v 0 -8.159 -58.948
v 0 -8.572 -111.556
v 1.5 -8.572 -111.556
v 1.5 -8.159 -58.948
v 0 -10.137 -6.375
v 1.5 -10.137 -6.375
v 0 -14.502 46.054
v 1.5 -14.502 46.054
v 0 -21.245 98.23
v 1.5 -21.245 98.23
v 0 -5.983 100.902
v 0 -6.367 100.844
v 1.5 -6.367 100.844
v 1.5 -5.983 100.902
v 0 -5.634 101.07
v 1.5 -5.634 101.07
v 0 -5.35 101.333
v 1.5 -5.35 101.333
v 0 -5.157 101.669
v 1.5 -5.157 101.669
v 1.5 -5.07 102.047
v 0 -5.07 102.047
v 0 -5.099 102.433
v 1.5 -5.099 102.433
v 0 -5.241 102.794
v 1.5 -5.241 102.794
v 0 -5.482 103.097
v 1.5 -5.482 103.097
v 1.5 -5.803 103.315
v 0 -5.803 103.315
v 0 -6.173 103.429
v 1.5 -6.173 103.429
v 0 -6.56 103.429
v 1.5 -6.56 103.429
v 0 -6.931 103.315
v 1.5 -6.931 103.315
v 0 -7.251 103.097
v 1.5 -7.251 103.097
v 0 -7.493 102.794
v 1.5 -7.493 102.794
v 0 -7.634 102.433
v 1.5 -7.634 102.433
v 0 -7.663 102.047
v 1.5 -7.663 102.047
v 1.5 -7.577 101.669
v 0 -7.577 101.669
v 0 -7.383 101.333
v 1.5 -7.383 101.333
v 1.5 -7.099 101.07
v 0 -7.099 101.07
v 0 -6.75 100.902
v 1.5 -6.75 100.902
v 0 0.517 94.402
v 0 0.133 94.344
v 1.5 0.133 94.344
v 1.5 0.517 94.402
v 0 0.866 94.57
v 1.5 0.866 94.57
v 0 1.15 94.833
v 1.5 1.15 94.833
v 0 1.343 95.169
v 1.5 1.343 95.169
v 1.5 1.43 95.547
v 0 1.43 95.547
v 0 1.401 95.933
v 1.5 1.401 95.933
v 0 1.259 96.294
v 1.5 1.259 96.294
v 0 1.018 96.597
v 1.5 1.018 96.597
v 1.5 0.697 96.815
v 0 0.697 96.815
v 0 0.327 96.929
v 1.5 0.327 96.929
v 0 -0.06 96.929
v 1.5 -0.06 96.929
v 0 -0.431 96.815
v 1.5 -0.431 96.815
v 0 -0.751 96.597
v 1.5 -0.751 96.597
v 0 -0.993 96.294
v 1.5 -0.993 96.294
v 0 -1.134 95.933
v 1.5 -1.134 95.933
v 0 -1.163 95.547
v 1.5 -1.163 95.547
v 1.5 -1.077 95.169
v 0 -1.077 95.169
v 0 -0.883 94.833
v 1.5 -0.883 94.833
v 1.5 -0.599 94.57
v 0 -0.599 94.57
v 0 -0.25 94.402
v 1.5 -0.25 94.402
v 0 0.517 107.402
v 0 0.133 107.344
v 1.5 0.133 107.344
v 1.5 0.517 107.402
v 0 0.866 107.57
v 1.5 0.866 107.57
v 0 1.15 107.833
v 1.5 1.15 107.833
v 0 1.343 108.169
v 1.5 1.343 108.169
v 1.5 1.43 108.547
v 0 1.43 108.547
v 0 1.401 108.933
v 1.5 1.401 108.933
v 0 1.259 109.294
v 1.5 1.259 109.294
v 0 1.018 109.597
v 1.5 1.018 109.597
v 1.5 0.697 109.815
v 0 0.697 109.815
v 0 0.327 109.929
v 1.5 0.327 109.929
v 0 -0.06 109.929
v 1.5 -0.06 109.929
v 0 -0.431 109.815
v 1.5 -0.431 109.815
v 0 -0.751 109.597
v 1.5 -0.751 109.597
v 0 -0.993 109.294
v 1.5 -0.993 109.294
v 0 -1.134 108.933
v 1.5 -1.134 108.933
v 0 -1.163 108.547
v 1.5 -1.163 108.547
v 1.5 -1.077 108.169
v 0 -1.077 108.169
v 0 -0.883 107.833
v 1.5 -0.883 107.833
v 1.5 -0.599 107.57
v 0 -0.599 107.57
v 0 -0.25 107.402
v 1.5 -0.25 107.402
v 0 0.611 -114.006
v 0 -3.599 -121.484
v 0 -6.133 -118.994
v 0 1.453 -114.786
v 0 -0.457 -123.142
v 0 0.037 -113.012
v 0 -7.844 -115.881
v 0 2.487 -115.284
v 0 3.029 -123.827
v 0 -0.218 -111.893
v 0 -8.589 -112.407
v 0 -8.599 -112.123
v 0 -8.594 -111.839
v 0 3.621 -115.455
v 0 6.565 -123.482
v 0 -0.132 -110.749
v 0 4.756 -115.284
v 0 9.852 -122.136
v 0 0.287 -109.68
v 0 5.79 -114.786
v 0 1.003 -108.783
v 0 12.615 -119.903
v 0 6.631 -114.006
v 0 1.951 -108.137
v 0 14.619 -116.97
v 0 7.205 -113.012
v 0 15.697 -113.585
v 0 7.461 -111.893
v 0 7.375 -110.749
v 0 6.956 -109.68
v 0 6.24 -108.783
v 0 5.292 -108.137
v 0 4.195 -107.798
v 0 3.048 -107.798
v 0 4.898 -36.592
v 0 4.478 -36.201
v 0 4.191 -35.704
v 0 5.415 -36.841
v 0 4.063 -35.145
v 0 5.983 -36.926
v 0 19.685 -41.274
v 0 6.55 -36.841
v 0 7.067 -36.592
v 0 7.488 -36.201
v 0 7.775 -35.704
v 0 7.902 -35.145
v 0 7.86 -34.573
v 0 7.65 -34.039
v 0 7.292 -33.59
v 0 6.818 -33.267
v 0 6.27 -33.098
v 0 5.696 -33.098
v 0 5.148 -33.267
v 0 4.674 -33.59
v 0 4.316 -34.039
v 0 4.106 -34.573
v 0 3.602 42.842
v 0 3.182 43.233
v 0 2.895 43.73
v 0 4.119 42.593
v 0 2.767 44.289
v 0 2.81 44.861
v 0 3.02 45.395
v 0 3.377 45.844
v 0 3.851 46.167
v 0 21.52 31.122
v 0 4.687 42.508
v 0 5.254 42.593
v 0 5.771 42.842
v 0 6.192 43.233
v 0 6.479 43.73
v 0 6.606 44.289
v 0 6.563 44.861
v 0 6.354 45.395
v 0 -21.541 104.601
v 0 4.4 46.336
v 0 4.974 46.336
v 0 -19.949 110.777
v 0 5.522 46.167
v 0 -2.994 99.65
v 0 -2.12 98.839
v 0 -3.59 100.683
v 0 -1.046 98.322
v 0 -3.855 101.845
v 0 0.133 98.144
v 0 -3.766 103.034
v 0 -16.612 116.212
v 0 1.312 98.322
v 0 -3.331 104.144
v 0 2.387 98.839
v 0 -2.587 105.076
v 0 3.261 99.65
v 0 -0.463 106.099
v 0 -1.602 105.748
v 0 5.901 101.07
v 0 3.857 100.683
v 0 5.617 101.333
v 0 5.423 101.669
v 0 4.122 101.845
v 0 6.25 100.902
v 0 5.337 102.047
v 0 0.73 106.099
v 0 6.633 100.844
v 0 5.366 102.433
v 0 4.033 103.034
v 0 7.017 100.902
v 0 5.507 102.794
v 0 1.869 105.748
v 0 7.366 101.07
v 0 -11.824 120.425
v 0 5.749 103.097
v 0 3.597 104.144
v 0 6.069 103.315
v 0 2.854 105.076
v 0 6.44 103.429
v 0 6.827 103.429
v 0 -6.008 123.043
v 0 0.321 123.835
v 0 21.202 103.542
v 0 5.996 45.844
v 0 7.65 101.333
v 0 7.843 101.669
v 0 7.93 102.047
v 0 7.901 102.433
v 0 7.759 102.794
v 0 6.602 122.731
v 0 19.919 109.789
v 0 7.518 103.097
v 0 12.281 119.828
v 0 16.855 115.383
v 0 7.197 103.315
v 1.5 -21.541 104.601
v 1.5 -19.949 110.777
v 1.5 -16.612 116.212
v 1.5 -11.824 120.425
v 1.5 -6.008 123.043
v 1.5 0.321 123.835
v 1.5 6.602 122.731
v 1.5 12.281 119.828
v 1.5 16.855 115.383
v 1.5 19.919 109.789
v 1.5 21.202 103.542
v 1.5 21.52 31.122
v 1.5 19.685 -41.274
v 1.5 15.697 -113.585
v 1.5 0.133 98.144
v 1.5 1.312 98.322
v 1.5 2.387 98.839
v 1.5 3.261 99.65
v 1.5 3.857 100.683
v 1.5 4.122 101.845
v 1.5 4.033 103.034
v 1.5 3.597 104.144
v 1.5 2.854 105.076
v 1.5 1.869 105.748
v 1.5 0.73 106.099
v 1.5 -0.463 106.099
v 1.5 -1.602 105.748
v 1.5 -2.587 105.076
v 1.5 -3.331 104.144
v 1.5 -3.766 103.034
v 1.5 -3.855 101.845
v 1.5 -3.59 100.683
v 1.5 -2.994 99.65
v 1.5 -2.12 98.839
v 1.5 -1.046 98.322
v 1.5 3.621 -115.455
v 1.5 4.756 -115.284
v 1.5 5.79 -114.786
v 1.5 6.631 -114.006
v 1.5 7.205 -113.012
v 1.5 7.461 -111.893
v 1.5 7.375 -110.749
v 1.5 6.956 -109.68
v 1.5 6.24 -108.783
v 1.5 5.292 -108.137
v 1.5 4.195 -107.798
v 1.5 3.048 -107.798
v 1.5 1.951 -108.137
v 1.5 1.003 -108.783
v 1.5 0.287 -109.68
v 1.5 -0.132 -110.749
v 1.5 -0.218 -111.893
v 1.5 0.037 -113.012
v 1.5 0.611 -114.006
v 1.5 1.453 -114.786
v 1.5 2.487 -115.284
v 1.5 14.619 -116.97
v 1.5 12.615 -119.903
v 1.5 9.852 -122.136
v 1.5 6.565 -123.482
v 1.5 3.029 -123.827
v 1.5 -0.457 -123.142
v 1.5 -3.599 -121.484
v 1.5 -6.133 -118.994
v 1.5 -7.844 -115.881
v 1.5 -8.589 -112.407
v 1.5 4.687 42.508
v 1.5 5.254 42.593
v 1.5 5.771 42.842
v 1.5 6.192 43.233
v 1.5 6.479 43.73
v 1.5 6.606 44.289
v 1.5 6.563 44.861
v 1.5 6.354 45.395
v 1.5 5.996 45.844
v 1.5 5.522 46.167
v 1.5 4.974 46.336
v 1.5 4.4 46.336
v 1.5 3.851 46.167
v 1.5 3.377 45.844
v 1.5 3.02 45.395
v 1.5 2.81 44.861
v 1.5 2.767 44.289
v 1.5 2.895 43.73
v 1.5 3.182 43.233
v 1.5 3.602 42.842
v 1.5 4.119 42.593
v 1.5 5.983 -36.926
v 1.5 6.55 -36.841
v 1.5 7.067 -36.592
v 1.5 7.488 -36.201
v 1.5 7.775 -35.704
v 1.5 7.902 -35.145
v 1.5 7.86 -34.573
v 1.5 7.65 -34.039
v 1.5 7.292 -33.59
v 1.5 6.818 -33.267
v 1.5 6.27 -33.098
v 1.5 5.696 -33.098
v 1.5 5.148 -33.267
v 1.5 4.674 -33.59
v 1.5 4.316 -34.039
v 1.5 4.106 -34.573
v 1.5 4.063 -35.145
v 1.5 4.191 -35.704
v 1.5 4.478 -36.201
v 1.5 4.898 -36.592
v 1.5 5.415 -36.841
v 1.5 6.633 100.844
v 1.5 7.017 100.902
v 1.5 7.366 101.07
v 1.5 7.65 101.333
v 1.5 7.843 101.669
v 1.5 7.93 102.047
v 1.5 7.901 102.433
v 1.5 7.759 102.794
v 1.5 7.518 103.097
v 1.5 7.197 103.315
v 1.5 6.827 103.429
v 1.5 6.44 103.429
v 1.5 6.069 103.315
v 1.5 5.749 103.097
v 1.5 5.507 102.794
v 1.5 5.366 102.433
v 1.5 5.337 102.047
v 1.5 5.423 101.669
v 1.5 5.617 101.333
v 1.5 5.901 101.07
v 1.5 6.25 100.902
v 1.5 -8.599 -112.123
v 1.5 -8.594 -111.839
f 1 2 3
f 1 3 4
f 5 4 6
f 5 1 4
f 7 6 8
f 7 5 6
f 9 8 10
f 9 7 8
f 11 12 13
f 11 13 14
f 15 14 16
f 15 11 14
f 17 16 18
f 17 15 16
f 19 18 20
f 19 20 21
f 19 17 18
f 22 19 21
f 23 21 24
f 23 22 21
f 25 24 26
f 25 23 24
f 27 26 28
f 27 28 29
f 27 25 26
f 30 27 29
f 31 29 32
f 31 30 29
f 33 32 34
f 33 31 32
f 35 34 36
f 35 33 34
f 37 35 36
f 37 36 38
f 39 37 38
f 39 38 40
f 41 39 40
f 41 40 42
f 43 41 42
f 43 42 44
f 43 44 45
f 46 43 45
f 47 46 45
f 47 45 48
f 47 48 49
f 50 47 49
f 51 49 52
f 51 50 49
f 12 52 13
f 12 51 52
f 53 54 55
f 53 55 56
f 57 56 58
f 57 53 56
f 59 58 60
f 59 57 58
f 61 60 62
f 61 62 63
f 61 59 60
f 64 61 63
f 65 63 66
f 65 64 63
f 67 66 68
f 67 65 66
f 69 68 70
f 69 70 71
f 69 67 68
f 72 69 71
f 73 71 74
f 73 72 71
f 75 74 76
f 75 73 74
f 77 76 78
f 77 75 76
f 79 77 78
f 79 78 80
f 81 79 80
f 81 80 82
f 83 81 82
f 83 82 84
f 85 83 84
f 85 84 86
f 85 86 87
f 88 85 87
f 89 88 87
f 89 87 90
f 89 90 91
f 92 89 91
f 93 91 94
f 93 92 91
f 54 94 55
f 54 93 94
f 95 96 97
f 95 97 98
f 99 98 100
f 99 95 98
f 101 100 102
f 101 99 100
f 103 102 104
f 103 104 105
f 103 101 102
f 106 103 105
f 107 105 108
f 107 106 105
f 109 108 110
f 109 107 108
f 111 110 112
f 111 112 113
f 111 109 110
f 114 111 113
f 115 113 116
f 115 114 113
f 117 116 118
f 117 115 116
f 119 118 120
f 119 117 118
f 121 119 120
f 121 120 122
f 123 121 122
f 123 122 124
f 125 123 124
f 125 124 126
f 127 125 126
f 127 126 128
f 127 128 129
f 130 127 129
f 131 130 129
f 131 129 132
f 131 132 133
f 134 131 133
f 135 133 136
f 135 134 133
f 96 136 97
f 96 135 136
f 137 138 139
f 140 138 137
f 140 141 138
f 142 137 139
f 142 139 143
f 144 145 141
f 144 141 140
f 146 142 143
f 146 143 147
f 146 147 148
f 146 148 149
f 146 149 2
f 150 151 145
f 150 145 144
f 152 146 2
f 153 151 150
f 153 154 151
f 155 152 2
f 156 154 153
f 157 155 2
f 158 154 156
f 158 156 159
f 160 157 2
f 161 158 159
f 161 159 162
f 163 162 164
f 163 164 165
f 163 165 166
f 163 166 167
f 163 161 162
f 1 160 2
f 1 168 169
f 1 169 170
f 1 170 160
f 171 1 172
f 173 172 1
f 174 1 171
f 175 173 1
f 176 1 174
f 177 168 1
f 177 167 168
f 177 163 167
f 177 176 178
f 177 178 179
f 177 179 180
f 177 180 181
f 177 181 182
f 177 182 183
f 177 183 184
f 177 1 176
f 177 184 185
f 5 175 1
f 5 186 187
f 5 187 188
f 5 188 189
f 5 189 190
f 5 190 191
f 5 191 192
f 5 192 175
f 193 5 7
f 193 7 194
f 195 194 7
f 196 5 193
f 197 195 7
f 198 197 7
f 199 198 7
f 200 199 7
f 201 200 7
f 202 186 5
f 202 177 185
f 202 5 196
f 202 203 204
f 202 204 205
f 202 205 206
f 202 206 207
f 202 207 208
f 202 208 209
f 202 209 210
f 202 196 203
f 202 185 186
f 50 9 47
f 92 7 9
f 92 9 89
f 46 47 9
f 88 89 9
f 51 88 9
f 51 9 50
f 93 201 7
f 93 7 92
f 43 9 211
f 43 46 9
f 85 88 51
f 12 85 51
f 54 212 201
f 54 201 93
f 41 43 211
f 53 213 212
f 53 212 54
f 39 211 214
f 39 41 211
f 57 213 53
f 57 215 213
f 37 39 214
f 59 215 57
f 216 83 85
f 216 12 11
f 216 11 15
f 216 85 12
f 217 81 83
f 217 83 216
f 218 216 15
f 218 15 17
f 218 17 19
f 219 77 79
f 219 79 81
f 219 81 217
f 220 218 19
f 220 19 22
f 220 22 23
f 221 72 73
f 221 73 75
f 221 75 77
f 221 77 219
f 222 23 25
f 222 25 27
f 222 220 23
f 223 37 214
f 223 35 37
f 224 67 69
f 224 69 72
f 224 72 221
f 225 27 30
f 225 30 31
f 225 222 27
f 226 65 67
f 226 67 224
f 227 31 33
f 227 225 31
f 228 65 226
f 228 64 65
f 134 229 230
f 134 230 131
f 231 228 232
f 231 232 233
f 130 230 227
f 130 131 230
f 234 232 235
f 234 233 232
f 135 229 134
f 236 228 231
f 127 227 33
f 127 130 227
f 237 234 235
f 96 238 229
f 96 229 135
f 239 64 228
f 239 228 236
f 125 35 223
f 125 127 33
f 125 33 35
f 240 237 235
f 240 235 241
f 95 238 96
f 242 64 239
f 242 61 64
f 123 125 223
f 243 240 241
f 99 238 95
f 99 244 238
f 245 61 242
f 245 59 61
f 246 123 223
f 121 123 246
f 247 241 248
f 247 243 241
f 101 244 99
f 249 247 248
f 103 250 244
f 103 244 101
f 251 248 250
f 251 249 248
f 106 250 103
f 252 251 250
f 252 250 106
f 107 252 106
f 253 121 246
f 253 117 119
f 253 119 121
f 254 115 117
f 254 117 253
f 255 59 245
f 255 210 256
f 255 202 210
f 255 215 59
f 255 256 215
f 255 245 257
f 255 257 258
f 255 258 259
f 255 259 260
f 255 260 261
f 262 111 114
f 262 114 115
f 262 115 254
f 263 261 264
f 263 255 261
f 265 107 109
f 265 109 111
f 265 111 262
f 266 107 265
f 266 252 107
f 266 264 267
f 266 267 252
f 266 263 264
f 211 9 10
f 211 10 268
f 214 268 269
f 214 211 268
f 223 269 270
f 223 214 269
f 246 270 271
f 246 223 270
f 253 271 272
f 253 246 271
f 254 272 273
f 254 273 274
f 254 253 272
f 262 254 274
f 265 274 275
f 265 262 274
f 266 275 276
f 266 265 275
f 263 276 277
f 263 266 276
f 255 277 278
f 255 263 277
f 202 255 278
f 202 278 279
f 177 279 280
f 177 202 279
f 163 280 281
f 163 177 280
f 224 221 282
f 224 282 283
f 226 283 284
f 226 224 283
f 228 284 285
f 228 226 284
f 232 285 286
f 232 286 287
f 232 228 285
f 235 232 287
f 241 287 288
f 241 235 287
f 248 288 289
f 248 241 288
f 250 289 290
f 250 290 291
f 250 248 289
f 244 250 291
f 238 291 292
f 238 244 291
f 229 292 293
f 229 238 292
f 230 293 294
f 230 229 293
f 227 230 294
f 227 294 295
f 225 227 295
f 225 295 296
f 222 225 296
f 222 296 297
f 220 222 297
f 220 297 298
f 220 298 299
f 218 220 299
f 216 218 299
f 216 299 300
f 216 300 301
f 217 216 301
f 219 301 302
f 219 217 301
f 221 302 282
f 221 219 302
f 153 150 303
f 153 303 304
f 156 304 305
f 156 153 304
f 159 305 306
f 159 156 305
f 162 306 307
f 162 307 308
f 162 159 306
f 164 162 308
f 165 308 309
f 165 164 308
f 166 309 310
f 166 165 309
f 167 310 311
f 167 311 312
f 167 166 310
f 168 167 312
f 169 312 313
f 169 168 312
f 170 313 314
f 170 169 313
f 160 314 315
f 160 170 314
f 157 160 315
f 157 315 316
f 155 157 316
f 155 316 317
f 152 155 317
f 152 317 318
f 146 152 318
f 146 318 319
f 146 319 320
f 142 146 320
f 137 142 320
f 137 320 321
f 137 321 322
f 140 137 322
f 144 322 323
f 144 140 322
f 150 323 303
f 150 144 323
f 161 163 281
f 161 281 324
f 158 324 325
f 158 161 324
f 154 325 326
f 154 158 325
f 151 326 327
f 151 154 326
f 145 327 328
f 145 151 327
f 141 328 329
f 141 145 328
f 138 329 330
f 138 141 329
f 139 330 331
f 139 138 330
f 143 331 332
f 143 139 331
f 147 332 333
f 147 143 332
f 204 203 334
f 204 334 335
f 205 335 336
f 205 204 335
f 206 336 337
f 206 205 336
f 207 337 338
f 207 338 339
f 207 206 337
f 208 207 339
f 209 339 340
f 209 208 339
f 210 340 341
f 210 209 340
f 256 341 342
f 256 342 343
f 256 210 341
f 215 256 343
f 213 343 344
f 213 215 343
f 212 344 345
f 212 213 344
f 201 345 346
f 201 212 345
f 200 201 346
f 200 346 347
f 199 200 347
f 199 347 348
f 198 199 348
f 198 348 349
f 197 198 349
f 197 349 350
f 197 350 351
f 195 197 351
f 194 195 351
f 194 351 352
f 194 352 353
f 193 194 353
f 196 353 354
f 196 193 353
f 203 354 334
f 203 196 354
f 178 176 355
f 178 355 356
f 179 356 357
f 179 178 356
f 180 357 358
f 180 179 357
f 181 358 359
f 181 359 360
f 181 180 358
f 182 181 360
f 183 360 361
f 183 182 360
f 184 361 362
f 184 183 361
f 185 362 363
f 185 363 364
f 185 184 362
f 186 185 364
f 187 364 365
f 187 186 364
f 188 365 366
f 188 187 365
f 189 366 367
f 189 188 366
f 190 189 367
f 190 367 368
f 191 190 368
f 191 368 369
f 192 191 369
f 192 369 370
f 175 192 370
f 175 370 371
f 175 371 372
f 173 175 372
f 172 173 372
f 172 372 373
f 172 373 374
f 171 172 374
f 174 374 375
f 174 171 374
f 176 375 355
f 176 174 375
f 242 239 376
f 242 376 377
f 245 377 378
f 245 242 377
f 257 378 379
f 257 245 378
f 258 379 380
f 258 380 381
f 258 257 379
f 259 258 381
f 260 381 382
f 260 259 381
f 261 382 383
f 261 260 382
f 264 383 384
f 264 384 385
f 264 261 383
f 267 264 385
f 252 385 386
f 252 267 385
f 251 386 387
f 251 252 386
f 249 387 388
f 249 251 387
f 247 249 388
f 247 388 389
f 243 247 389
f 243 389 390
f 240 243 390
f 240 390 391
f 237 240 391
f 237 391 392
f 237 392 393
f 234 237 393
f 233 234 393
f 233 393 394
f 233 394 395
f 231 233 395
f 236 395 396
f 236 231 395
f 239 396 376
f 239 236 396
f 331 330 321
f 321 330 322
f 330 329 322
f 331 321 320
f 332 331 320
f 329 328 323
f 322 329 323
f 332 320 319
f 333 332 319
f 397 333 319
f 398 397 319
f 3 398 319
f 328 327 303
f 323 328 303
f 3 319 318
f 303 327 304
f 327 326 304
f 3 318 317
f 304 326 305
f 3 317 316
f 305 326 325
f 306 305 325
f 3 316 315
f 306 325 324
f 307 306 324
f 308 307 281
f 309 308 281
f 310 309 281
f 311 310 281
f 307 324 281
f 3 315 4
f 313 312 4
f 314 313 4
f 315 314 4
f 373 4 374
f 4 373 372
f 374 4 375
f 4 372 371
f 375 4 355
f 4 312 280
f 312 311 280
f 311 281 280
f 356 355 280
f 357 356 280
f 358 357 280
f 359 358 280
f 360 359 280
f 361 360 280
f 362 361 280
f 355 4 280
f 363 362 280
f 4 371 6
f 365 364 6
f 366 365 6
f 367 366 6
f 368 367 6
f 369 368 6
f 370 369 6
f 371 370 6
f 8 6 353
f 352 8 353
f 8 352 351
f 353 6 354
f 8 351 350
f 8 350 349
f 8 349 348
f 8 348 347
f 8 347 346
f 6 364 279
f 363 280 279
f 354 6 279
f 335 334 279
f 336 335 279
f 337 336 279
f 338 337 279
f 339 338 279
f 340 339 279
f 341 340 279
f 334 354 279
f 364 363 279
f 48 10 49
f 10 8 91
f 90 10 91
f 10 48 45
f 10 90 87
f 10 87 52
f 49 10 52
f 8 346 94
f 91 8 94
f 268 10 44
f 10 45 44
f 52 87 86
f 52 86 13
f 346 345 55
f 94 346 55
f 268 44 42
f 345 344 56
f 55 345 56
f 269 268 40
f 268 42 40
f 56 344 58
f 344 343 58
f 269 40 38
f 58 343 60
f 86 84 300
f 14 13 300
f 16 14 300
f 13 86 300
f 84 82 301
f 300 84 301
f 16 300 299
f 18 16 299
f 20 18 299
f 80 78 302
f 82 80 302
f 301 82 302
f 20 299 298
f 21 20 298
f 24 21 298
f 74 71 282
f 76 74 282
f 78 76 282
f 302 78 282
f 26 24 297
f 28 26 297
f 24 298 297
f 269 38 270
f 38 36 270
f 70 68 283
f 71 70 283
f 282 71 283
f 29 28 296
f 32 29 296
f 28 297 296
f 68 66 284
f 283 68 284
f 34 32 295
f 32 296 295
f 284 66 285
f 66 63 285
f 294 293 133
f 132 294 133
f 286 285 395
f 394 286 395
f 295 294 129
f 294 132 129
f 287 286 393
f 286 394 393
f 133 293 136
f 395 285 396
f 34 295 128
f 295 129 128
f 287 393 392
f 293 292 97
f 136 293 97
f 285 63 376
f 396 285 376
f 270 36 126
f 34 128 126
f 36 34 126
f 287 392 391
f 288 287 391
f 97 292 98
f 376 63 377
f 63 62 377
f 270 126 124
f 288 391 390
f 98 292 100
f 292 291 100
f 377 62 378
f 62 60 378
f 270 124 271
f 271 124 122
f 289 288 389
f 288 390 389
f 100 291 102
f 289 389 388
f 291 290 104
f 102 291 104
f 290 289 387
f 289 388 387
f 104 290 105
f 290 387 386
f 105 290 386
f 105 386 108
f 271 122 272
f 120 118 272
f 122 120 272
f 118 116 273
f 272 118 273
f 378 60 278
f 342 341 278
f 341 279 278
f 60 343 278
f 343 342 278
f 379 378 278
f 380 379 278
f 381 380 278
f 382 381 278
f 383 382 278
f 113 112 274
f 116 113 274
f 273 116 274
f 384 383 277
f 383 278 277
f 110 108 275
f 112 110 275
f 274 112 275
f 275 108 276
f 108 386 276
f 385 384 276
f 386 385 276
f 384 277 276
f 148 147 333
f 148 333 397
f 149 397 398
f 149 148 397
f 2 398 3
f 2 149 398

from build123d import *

# Parameters (mm, degrees)
SKETCH_1_R      = 1.3
SKETCH_1_R_2    = 4
SKETCH_1_R_3    = 1.925
SKETCH_1_R_4    = 3.85
EXTRUDE_1_DEPTH = 1.5


with BuildPart() as part:
    # 草圖1 → 填料-伸長1 (new body)
    with BuildSketch(Plane(origin=(0, 0, 0), x_dir=(0, 0, -1), z_dir=(1, 0, 0))):
        with BuildLine():
            ThreePointArc((111.555989952, -8.572011863), (6.374730125, -10.137132711), (-98.230068302, -21.244930328))
            ThreePointArc((-98.230068302, -21.244930328), (-123.67575498, -2.873316644), (-103.541794939, 21.20204032))
            ThreePointArc((-103.541794939, 21.20204032), (5.082777822, 20.871677912), (113.584507189, 15.696576829))
            ThreePointArc((113.584507189, 15.696576829), (123.827345593, 3.028727453), (112.406990492, -8.588743688))
            ThreePointArc((112.406990492, -8.588743688), (111.981133536, -8.59851924), (111.555989952, -8.572011863))
        make_face()
        with Locations((-102.143981395, 6.633331517)):
            Circle(SKETCH_1_R, mode=Mode.SUBTRACT)
        with Locations((-108.643981395, 0.133331517)):
            Circle(SKETCH_1_R, mode=Mode.SUBTRACT)
        with Locations((-102.143981395, -6.366668483)):
            Circle(SKETCH_1_R, mode=Mode.SUBTRACT)
        with Locations((-95.643981395, 0.133331517)):
            Circle(SKETCH_1_R, mode=Mode.SUBTRACT)
        with Locations((-102.143981395, 0.133331517)):
            Circle(SKETCH_1_R_2, mode=Mode.SUBTRACT)
        with Locations((35.001055541, 5.982881827)):
            Circle(SKETCH_1_R_3, mode=Mode.SUBTRACT)
        with Locations((-44.432813653, 4.686665047)):
            Circle(SKETCH_1_R_3, mode=Mode.SUBTRACT)
        with Locations((111.605339346, 3.621333032)):
            Circle(SKETCH_1_R_4, mode=Mode.SUBTRACT)
    extrude(amount=EXTRUDE_1_DEPTH)


solid = part.part
